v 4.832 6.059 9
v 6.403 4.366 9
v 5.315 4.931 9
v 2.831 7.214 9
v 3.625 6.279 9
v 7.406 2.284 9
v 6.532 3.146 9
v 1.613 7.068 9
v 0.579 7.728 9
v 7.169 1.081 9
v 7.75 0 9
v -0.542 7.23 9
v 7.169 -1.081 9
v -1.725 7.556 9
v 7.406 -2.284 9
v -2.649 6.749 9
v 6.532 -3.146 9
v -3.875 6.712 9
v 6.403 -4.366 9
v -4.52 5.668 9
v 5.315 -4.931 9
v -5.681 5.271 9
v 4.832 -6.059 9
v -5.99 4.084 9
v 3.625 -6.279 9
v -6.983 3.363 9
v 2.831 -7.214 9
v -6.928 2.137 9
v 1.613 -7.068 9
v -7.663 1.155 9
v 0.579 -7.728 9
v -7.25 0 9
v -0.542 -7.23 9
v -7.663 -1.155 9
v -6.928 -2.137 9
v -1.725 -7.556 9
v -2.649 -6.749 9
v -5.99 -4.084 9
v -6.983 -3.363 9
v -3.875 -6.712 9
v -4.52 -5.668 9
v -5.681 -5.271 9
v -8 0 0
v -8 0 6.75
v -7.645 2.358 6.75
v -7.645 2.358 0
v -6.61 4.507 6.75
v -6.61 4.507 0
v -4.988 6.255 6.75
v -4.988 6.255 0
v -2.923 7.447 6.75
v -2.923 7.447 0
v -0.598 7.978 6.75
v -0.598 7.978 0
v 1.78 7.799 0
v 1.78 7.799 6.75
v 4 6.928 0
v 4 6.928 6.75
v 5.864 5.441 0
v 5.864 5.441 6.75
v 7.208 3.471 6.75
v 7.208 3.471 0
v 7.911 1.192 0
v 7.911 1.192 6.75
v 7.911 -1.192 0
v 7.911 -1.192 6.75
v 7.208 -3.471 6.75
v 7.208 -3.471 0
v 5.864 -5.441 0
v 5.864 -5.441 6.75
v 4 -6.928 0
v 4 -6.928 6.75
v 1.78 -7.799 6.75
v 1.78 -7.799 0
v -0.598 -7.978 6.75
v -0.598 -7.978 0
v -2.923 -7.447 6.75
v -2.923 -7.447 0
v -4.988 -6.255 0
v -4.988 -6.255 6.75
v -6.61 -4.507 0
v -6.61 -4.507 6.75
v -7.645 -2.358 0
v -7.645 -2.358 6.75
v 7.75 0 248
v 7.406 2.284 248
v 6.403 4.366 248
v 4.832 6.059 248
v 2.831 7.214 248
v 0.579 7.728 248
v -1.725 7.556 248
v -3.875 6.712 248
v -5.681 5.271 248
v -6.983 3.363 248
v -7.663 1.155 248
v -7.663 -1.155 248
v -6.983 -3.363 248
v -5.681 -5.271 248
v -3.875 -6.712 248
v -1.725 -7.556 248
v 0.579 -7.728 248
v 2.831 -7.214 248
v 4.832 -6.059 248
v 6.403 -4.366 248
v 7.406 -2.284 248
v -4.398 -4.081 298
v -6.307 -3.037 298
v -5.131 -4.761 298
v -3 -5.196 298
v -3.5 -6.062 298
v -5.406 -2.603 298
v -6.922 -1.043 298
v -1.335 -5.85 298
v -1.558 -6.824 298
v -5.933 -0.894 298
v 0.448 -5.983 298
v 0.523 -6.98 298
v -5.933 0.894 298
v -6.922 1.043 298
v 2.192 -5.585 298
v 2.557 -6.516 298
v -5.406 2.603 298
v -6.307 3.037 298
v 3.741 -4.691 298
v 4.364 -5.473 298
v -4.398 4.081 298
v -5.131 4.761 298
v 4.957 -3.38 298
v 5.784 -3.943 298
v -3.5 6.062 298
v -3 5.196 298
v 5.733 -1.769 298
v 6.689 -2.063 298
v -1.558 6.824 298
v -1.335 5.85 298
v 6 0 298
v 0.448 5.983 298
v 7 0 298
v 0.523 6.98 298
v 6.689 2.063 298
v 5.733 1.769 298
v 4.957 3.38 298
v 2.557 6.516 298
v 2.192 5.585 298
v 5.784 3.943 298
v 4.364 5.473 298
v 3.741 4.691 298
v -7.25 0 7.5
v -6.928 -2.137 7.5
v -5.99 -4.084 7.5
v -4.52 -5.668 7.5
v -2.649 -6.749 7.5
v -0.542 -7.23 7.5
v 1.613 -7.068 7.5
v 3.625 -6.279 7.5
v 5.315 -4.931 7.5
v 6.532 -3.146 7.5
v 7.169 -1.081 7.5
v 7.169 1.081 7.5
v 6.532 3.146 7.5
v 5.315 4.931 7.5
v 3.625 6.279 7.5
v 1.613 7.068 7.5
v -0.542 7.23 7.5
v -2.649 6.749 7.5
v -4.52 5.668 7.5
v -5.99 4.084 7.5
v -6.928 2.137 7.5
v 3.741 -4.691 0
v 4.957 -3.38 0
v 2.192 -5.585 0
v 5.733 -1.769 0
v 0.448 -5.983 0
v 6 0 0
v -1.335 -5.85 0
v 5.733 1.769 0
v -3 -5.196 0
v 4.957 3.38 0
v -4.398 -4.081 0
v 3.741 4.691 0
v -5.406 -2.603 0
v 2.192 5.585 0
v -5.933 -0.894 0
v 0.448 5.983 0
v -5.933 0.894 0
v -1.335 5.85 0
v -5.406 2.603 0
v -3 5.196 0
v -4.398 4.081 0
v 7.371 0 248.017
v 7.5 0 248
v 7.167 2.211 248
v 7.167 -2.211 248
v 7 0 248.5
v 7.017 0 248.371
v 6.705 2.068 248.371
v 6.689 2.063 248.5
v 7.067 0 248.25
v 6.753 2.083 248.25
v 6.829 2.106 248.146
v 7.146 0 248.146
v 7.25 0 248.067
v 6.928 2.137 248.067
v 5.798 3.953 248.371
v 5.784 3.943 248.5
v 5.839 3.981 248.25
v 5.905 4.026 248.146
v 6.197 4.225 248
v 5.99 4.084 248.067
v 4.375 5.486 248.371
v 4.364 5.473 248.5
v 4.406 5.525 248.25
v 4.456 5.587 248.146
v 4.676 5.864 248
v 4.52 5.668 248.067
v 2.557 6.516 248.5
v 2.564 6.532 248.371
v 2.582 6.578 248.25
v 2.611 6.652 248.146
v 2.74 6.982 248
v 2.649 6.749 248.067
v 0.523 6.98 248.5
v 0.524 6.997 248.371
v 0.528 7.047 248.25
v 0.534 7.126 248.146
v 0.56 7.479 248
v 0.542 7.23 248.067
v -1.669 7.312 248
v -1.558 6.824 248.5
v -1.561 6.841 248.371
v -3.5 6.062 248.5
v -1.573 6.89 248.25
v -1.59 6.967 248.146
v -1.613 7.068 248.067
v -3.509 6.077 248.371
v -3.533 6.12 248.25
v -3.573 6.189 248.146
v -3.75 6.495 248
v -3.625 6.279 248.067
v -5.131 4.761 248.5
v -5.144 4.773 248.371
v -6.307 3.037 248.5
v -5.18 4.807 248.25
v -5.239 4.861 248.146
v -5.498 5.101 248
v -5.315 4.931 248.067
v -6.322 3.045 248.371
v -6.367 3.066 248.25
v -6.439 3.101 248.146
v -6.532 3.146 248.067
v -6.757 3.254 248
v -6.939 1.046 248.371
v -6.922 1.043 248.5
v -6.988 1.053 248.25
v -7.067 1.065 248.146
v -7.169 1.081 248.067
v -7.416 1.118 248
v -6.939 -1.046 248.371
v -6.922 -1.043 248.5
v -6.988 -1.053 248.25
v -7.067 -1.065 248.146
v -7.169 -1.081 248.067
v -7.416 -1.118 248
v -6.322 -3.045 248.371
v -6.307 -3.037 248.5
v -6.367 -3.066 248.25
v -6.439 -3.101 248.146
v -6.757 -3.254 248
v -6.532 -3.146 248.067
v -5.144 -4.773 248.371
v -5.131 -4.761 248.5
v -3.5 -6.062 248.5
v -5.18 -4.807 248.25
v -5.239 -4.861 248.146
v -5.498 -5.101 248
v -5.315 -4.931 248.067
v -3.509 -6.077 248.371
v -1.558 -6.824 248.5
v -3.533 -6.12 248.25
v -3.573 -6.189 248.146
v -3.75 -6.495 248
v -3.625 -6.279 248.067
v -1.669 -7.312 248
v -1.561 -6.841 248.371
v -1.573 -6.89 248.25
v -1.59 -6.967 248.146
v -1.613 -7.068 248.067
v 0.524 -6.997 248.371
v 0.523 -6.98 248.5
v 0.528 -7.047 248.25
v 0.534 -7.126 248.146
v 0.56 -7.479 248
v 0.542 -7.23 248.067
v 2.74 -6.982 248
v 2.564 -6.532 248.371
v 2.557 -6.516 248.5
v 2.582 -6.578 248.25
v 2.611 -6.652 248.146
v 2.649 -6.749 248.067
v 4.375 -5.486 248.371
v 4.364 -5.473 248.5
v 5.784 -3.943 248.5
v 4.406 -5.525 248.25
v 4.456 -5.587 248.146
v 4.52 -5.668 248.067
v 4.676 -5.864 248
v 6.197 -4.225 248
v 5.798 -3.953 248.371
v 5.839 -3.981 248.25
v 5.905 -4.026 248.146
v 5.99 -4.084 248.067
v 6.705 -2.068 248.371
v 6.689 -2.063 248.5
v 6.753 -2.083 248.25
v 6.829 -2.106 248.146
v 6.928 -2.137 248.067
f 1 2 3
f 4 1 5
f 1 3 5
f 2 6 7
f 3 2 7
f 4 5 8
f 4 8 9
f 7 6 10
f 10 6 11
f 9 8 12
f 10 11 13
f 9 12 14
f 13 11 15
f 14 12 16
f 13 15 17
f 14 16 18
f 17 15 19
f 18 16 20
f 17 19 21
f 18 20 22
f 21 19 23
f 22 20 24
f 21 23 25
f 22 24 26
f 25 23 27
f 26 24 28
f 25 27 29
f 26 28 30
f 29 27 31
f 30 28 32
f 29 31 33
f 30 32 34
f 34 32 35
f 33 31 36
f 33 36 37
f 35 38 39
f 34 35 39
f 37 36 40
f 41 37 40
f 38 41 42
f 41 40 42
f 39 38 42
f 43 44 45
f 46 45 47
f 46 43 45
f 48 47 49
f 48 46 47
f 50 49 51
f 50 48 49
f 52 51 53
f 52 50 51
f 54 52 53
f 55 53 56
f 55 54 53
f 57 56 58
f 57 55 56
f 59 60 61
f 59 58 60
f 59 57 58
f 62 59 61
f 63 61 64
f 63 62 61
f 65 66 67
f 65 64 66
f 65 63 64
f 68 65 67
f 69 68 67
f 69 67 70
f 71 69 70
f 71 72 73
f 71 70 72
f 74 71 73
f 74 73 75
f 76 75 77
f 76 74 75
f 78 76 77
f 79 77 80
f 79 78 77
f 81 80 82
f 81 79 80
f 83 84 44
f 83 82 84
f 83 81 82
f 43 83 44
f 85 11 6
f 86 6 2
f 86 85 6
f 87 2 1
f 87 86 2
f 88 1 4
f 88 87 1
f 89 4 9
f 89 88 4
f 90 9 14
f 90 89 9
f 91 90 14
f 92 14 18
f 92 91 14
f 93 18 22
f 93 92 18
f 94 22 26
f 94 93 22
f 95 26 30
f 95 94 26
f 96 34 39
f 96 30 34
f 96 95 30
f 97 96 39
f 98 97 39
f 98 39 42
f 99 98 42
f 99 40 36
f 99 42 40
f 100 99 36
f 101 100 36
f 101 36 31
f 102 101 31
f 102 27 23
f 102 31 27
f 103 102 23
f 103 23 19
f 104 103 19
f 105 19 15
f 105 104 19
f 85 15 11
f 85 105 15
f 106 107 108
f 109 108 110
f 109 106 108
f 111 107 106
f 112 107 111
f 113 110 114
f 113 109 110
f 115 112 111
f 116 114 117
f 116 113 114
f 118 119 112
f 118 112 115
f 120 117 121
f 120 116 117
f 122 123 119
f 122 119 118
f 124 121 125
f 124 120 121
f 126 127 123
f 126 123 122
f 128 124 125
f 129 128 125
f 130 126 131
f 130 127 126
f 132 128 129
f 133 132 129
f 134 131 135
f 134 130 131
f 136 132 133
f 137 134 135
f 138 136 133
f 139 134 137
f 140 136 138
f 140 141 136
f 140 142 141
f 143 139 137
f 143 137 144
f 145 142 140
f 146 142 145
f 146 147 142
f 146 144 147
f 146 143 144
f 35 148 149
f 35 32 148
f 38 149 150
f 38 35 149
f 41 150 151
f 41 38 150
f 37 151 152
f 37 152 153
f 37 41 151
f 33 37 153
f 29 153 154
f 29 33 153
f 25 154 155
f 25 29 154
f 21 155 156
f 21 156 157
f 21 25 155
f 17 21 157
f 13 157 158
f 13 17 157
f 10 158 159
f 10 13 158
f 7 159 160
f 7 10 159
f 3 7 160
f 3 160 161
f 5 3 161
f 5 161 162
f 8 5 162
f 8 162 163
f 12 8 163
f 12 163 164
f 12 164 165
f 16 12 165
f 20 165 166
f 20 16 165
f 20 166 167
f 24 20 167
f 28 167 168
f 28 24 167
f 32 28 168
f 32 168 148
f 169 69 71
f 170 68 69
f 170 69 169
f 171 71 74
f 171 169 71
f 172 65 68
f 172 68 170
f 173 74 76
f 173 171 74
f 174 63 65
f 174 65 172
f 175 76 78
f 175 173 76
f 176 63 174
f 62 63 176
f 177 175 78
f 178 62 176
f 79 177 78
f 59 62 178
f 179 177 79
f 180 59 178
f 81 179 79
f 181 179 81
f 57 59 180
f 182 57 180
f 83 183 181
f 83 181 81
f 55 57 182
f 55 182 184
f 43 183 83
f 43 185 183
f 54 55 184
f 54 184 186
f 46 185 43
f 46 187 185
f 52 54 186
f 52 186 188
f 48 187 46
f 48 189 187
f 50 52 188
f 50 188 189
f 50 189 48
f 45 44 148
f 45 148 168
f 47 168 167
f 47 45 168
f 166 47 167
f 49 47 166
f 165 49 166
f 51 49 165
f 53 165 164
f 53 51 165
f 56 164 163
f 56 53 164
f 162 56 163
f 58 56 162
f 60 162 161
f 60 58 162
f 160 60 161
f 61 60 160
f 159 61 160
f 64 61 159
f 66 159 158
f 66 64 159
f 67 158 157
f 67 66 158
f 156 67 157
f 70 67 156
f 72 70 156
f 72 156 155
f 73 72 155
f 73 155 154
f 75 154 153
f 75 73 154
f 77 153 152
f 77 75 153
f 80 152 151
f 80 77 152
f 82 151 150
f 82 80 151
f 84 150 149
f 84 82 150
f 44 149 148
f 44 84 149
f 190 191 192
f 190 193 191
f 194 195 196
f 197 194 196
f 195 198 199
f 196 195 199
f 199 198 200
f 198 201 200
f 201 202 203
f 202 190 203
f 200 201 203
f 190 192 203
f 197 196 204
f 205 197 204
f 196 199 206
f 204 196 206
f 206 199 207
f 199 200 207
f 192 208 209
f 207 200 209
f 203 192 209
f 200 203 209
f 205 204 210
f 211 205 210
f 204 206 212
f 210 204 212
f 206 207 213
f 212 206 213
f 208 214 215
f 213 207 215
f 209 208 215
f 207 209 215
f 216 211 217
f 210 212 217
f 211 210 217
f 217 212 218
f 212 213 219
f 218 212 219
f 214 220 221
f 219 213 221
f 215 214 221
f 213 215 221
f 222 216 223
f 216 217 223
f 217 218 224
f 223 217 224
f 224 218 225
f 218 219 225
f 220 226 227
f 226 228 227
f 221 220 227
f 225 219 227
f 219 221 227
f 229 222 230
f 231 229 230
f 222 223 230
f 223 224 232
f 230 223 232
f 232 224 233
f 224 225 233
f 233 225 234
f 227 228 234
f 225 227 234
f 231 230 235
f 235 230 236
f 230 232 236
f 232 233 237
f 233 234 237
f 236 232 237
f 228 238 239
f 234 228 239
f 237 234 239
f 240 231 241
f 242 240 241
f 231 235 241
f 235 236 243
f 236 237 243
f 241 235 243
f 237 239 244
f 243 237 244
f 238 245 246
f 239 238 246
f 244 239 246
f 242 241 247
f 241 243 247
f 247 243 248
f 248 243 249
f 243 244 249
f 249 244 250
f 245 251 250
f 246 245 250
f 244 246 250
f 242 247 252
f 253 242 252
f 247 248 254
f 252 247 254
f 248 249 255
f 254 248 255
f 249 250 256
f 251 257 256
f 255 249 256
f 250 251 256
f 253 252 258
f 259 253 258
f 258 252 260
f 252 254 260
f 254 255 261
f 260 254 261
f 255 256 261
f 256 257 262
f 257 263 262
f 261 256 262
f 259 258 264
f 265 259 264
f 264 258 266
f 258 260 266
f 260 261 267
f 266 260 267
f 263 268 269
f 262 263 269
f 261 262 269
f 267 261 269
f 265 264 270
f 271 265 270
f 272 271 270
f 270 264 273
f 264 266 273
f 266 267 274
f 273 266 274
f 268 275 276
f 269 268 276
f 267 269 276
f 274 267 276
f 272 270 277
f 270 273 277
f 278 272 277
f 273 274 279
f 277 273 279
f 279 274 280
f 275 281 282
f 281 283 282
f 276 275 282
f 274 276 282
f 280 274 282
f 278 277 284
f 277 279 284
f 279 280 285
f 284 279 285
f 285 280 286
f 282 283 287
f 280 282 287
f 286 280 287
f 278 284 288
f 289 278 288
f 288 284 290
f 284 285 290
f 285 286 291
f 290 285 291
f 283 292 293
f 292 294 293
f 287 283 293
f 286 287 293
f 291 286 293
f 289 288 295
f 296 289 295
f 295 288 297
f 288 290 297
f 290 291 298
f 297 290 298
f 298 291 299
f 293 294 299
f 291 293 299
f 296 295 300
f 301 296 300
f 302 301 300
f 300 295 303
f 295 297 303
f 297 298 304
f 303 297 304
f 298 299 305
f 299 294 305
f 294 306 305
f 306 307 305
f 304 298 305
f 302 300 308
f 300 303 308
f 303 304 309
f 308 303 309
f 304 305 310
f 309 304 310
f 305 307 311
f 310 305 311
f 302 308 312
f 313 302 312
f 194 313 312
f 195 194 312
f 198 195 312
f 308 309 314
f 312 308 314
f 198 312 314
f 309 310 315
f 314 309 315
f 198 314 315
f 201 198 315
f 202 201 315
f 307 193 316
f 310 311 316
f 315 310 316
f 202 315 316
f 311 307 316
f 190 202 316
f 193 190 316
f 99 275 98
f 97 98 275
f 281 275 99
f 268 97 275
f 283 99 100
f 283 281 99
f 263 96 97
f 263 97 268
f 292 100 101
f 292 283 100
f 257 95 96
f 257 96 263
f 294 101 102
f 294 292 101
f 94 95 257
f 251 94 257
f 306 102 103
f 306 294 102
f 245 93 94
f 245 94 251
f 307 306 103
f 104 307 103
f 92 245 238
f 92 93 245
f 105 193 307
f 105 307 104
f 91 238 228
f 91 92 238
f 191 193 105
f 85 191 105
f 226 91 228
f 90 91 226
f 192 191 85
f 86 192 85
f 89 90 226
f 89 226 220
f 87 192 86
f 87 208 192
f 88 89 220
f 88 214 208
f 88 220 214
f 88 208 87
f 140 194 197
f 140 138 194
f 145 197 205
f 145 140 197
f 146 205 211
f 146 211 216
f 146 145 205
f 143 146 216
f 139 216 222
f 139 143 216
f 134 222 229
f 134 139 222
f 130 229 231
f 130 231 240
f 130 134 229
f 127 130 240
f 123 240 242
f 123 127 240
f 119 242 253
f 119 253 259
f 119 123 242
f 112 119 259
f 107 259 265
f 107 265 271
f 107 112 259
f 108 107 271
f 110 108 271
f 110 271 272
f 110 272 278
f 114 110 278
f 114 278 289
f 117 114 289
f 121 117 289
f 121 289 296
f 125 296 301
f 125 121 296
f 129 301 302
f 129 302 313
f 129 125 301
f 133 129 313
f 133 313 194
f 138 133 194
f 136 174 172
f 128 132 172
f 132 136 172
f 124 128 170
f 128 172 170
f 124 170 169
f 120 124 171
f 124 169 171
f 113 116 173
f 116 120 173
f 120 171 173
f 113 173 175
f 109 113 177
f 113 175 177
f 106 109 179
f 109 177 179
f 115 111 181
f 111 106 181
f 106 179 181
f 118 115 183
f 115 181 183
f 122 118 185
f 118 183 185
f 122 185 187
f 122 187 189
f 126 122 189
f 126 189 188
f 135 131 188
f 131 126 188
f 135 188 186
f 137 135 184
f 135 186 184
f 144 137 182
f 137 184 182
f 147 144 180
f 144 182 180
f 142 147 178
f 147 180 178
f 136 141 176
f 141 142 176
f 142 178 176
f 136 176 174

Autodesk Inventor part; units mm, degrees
ref_plane "YZ Plane" through (0, 0, 0) normal (1, 0, 0) x (0, 1, 0)
ref_plane "XZ Plane" through (0, 0, 0) normal (0, 1, 0) x (-1, 0, 0)
ref_plane "XY Plane" through (0, 0, 0) normal (0, 0, 1) x (1, 0, 0)
sketch "Skizze1" plane through (0, 0, 0) normal (0, 0, 1) x (1, 0, 0)
  circle A0 centre (0, 0) radius 8
  circle A1 centre (0, 0) radius 6
  dimension "d0" = 2
  dimension "d1" = 16
extrude "Extrusion1" add sketch "Skizze1" along normal blind 298
sketch "Skizze2" plane through (0, 0, 298) normal (0, 0, 1) x (1, 0, 0)
  circle A0 centre (0, 0) radius 8 projected
  circle A1 centre (0, 0) radius 7
  dimension "d4" = 14
extrude "Extrusion2" cut sketch "Skizze2" against normal blind 50
sketch "Skizze3" plane through (0, 0, 248) normal (0, 0, 1) x (1, 0, 0)
  circle A0 centre (0, 0) radius 8 projected
  circle A1 centre (0, 0) radius 7.75
  dimension "d7" = 15.5
extrude "Extrusion3" cut sketch "Skizze3" against normal through all
sketch "Skizze4" plane through (0, 0, 0) normal (0, 0, -1) x (-1, 0, 0)
  circle A0 centre (0, 0) radius 7.75 projected
  circle A1 centre (0, 0) radius 6 projected
  circle A2 centre (0, 0) radius 8
  dimension "d10" = 16
extrude "Extrusion4" add sketch "Skizze4" against normal blind 9 contours A2
sketch "Skizze5" plane through (0, 0, 0) normal (0, 1, 0) x (-1, 0, 0)
  line L0 (-8, 9) -> (8, 9) projected
  line L1 (8, 0) -> (-8, 0) projected
  line L2 (8, 0) -> (8, 9) projected
  line L3 (6, 0) -> (6, 298) projected
  line L4 (7.75, 248) -> (7.75, 9) projected
  line L5 (0, -50) -> (0, 300) projected
  line L6 (8, 7.5) -> (7.25, 7.5)
  line L7 (7.25, 7.5) -> (7.25, 9)
  line L8 (8, 9) -> (7.25, 9)
  line L9 (8, 9) -> (8, 7.5)
  point P0 (0, 0)
  dimension "d17" = 1.5
  dimension "d18" = 14.5
revolve "Umdrehung1" cut sketch "Skizze5" angle 360 about axis through (0, 0, -10) along (0, 0, 1) contours L0 L2 L6 L7
chamfer "Fase1" distance 0.75 angle 45 1 edges at (8, 0, 7.5)
thread "Gewinde3" size "M16x1" class "6g" standard "ANSI Metric M Profile" full length
fillet "Rundung1" radius 0.5 1 edges at (-7, 0, 248)
properties part number "13_0204_023"
